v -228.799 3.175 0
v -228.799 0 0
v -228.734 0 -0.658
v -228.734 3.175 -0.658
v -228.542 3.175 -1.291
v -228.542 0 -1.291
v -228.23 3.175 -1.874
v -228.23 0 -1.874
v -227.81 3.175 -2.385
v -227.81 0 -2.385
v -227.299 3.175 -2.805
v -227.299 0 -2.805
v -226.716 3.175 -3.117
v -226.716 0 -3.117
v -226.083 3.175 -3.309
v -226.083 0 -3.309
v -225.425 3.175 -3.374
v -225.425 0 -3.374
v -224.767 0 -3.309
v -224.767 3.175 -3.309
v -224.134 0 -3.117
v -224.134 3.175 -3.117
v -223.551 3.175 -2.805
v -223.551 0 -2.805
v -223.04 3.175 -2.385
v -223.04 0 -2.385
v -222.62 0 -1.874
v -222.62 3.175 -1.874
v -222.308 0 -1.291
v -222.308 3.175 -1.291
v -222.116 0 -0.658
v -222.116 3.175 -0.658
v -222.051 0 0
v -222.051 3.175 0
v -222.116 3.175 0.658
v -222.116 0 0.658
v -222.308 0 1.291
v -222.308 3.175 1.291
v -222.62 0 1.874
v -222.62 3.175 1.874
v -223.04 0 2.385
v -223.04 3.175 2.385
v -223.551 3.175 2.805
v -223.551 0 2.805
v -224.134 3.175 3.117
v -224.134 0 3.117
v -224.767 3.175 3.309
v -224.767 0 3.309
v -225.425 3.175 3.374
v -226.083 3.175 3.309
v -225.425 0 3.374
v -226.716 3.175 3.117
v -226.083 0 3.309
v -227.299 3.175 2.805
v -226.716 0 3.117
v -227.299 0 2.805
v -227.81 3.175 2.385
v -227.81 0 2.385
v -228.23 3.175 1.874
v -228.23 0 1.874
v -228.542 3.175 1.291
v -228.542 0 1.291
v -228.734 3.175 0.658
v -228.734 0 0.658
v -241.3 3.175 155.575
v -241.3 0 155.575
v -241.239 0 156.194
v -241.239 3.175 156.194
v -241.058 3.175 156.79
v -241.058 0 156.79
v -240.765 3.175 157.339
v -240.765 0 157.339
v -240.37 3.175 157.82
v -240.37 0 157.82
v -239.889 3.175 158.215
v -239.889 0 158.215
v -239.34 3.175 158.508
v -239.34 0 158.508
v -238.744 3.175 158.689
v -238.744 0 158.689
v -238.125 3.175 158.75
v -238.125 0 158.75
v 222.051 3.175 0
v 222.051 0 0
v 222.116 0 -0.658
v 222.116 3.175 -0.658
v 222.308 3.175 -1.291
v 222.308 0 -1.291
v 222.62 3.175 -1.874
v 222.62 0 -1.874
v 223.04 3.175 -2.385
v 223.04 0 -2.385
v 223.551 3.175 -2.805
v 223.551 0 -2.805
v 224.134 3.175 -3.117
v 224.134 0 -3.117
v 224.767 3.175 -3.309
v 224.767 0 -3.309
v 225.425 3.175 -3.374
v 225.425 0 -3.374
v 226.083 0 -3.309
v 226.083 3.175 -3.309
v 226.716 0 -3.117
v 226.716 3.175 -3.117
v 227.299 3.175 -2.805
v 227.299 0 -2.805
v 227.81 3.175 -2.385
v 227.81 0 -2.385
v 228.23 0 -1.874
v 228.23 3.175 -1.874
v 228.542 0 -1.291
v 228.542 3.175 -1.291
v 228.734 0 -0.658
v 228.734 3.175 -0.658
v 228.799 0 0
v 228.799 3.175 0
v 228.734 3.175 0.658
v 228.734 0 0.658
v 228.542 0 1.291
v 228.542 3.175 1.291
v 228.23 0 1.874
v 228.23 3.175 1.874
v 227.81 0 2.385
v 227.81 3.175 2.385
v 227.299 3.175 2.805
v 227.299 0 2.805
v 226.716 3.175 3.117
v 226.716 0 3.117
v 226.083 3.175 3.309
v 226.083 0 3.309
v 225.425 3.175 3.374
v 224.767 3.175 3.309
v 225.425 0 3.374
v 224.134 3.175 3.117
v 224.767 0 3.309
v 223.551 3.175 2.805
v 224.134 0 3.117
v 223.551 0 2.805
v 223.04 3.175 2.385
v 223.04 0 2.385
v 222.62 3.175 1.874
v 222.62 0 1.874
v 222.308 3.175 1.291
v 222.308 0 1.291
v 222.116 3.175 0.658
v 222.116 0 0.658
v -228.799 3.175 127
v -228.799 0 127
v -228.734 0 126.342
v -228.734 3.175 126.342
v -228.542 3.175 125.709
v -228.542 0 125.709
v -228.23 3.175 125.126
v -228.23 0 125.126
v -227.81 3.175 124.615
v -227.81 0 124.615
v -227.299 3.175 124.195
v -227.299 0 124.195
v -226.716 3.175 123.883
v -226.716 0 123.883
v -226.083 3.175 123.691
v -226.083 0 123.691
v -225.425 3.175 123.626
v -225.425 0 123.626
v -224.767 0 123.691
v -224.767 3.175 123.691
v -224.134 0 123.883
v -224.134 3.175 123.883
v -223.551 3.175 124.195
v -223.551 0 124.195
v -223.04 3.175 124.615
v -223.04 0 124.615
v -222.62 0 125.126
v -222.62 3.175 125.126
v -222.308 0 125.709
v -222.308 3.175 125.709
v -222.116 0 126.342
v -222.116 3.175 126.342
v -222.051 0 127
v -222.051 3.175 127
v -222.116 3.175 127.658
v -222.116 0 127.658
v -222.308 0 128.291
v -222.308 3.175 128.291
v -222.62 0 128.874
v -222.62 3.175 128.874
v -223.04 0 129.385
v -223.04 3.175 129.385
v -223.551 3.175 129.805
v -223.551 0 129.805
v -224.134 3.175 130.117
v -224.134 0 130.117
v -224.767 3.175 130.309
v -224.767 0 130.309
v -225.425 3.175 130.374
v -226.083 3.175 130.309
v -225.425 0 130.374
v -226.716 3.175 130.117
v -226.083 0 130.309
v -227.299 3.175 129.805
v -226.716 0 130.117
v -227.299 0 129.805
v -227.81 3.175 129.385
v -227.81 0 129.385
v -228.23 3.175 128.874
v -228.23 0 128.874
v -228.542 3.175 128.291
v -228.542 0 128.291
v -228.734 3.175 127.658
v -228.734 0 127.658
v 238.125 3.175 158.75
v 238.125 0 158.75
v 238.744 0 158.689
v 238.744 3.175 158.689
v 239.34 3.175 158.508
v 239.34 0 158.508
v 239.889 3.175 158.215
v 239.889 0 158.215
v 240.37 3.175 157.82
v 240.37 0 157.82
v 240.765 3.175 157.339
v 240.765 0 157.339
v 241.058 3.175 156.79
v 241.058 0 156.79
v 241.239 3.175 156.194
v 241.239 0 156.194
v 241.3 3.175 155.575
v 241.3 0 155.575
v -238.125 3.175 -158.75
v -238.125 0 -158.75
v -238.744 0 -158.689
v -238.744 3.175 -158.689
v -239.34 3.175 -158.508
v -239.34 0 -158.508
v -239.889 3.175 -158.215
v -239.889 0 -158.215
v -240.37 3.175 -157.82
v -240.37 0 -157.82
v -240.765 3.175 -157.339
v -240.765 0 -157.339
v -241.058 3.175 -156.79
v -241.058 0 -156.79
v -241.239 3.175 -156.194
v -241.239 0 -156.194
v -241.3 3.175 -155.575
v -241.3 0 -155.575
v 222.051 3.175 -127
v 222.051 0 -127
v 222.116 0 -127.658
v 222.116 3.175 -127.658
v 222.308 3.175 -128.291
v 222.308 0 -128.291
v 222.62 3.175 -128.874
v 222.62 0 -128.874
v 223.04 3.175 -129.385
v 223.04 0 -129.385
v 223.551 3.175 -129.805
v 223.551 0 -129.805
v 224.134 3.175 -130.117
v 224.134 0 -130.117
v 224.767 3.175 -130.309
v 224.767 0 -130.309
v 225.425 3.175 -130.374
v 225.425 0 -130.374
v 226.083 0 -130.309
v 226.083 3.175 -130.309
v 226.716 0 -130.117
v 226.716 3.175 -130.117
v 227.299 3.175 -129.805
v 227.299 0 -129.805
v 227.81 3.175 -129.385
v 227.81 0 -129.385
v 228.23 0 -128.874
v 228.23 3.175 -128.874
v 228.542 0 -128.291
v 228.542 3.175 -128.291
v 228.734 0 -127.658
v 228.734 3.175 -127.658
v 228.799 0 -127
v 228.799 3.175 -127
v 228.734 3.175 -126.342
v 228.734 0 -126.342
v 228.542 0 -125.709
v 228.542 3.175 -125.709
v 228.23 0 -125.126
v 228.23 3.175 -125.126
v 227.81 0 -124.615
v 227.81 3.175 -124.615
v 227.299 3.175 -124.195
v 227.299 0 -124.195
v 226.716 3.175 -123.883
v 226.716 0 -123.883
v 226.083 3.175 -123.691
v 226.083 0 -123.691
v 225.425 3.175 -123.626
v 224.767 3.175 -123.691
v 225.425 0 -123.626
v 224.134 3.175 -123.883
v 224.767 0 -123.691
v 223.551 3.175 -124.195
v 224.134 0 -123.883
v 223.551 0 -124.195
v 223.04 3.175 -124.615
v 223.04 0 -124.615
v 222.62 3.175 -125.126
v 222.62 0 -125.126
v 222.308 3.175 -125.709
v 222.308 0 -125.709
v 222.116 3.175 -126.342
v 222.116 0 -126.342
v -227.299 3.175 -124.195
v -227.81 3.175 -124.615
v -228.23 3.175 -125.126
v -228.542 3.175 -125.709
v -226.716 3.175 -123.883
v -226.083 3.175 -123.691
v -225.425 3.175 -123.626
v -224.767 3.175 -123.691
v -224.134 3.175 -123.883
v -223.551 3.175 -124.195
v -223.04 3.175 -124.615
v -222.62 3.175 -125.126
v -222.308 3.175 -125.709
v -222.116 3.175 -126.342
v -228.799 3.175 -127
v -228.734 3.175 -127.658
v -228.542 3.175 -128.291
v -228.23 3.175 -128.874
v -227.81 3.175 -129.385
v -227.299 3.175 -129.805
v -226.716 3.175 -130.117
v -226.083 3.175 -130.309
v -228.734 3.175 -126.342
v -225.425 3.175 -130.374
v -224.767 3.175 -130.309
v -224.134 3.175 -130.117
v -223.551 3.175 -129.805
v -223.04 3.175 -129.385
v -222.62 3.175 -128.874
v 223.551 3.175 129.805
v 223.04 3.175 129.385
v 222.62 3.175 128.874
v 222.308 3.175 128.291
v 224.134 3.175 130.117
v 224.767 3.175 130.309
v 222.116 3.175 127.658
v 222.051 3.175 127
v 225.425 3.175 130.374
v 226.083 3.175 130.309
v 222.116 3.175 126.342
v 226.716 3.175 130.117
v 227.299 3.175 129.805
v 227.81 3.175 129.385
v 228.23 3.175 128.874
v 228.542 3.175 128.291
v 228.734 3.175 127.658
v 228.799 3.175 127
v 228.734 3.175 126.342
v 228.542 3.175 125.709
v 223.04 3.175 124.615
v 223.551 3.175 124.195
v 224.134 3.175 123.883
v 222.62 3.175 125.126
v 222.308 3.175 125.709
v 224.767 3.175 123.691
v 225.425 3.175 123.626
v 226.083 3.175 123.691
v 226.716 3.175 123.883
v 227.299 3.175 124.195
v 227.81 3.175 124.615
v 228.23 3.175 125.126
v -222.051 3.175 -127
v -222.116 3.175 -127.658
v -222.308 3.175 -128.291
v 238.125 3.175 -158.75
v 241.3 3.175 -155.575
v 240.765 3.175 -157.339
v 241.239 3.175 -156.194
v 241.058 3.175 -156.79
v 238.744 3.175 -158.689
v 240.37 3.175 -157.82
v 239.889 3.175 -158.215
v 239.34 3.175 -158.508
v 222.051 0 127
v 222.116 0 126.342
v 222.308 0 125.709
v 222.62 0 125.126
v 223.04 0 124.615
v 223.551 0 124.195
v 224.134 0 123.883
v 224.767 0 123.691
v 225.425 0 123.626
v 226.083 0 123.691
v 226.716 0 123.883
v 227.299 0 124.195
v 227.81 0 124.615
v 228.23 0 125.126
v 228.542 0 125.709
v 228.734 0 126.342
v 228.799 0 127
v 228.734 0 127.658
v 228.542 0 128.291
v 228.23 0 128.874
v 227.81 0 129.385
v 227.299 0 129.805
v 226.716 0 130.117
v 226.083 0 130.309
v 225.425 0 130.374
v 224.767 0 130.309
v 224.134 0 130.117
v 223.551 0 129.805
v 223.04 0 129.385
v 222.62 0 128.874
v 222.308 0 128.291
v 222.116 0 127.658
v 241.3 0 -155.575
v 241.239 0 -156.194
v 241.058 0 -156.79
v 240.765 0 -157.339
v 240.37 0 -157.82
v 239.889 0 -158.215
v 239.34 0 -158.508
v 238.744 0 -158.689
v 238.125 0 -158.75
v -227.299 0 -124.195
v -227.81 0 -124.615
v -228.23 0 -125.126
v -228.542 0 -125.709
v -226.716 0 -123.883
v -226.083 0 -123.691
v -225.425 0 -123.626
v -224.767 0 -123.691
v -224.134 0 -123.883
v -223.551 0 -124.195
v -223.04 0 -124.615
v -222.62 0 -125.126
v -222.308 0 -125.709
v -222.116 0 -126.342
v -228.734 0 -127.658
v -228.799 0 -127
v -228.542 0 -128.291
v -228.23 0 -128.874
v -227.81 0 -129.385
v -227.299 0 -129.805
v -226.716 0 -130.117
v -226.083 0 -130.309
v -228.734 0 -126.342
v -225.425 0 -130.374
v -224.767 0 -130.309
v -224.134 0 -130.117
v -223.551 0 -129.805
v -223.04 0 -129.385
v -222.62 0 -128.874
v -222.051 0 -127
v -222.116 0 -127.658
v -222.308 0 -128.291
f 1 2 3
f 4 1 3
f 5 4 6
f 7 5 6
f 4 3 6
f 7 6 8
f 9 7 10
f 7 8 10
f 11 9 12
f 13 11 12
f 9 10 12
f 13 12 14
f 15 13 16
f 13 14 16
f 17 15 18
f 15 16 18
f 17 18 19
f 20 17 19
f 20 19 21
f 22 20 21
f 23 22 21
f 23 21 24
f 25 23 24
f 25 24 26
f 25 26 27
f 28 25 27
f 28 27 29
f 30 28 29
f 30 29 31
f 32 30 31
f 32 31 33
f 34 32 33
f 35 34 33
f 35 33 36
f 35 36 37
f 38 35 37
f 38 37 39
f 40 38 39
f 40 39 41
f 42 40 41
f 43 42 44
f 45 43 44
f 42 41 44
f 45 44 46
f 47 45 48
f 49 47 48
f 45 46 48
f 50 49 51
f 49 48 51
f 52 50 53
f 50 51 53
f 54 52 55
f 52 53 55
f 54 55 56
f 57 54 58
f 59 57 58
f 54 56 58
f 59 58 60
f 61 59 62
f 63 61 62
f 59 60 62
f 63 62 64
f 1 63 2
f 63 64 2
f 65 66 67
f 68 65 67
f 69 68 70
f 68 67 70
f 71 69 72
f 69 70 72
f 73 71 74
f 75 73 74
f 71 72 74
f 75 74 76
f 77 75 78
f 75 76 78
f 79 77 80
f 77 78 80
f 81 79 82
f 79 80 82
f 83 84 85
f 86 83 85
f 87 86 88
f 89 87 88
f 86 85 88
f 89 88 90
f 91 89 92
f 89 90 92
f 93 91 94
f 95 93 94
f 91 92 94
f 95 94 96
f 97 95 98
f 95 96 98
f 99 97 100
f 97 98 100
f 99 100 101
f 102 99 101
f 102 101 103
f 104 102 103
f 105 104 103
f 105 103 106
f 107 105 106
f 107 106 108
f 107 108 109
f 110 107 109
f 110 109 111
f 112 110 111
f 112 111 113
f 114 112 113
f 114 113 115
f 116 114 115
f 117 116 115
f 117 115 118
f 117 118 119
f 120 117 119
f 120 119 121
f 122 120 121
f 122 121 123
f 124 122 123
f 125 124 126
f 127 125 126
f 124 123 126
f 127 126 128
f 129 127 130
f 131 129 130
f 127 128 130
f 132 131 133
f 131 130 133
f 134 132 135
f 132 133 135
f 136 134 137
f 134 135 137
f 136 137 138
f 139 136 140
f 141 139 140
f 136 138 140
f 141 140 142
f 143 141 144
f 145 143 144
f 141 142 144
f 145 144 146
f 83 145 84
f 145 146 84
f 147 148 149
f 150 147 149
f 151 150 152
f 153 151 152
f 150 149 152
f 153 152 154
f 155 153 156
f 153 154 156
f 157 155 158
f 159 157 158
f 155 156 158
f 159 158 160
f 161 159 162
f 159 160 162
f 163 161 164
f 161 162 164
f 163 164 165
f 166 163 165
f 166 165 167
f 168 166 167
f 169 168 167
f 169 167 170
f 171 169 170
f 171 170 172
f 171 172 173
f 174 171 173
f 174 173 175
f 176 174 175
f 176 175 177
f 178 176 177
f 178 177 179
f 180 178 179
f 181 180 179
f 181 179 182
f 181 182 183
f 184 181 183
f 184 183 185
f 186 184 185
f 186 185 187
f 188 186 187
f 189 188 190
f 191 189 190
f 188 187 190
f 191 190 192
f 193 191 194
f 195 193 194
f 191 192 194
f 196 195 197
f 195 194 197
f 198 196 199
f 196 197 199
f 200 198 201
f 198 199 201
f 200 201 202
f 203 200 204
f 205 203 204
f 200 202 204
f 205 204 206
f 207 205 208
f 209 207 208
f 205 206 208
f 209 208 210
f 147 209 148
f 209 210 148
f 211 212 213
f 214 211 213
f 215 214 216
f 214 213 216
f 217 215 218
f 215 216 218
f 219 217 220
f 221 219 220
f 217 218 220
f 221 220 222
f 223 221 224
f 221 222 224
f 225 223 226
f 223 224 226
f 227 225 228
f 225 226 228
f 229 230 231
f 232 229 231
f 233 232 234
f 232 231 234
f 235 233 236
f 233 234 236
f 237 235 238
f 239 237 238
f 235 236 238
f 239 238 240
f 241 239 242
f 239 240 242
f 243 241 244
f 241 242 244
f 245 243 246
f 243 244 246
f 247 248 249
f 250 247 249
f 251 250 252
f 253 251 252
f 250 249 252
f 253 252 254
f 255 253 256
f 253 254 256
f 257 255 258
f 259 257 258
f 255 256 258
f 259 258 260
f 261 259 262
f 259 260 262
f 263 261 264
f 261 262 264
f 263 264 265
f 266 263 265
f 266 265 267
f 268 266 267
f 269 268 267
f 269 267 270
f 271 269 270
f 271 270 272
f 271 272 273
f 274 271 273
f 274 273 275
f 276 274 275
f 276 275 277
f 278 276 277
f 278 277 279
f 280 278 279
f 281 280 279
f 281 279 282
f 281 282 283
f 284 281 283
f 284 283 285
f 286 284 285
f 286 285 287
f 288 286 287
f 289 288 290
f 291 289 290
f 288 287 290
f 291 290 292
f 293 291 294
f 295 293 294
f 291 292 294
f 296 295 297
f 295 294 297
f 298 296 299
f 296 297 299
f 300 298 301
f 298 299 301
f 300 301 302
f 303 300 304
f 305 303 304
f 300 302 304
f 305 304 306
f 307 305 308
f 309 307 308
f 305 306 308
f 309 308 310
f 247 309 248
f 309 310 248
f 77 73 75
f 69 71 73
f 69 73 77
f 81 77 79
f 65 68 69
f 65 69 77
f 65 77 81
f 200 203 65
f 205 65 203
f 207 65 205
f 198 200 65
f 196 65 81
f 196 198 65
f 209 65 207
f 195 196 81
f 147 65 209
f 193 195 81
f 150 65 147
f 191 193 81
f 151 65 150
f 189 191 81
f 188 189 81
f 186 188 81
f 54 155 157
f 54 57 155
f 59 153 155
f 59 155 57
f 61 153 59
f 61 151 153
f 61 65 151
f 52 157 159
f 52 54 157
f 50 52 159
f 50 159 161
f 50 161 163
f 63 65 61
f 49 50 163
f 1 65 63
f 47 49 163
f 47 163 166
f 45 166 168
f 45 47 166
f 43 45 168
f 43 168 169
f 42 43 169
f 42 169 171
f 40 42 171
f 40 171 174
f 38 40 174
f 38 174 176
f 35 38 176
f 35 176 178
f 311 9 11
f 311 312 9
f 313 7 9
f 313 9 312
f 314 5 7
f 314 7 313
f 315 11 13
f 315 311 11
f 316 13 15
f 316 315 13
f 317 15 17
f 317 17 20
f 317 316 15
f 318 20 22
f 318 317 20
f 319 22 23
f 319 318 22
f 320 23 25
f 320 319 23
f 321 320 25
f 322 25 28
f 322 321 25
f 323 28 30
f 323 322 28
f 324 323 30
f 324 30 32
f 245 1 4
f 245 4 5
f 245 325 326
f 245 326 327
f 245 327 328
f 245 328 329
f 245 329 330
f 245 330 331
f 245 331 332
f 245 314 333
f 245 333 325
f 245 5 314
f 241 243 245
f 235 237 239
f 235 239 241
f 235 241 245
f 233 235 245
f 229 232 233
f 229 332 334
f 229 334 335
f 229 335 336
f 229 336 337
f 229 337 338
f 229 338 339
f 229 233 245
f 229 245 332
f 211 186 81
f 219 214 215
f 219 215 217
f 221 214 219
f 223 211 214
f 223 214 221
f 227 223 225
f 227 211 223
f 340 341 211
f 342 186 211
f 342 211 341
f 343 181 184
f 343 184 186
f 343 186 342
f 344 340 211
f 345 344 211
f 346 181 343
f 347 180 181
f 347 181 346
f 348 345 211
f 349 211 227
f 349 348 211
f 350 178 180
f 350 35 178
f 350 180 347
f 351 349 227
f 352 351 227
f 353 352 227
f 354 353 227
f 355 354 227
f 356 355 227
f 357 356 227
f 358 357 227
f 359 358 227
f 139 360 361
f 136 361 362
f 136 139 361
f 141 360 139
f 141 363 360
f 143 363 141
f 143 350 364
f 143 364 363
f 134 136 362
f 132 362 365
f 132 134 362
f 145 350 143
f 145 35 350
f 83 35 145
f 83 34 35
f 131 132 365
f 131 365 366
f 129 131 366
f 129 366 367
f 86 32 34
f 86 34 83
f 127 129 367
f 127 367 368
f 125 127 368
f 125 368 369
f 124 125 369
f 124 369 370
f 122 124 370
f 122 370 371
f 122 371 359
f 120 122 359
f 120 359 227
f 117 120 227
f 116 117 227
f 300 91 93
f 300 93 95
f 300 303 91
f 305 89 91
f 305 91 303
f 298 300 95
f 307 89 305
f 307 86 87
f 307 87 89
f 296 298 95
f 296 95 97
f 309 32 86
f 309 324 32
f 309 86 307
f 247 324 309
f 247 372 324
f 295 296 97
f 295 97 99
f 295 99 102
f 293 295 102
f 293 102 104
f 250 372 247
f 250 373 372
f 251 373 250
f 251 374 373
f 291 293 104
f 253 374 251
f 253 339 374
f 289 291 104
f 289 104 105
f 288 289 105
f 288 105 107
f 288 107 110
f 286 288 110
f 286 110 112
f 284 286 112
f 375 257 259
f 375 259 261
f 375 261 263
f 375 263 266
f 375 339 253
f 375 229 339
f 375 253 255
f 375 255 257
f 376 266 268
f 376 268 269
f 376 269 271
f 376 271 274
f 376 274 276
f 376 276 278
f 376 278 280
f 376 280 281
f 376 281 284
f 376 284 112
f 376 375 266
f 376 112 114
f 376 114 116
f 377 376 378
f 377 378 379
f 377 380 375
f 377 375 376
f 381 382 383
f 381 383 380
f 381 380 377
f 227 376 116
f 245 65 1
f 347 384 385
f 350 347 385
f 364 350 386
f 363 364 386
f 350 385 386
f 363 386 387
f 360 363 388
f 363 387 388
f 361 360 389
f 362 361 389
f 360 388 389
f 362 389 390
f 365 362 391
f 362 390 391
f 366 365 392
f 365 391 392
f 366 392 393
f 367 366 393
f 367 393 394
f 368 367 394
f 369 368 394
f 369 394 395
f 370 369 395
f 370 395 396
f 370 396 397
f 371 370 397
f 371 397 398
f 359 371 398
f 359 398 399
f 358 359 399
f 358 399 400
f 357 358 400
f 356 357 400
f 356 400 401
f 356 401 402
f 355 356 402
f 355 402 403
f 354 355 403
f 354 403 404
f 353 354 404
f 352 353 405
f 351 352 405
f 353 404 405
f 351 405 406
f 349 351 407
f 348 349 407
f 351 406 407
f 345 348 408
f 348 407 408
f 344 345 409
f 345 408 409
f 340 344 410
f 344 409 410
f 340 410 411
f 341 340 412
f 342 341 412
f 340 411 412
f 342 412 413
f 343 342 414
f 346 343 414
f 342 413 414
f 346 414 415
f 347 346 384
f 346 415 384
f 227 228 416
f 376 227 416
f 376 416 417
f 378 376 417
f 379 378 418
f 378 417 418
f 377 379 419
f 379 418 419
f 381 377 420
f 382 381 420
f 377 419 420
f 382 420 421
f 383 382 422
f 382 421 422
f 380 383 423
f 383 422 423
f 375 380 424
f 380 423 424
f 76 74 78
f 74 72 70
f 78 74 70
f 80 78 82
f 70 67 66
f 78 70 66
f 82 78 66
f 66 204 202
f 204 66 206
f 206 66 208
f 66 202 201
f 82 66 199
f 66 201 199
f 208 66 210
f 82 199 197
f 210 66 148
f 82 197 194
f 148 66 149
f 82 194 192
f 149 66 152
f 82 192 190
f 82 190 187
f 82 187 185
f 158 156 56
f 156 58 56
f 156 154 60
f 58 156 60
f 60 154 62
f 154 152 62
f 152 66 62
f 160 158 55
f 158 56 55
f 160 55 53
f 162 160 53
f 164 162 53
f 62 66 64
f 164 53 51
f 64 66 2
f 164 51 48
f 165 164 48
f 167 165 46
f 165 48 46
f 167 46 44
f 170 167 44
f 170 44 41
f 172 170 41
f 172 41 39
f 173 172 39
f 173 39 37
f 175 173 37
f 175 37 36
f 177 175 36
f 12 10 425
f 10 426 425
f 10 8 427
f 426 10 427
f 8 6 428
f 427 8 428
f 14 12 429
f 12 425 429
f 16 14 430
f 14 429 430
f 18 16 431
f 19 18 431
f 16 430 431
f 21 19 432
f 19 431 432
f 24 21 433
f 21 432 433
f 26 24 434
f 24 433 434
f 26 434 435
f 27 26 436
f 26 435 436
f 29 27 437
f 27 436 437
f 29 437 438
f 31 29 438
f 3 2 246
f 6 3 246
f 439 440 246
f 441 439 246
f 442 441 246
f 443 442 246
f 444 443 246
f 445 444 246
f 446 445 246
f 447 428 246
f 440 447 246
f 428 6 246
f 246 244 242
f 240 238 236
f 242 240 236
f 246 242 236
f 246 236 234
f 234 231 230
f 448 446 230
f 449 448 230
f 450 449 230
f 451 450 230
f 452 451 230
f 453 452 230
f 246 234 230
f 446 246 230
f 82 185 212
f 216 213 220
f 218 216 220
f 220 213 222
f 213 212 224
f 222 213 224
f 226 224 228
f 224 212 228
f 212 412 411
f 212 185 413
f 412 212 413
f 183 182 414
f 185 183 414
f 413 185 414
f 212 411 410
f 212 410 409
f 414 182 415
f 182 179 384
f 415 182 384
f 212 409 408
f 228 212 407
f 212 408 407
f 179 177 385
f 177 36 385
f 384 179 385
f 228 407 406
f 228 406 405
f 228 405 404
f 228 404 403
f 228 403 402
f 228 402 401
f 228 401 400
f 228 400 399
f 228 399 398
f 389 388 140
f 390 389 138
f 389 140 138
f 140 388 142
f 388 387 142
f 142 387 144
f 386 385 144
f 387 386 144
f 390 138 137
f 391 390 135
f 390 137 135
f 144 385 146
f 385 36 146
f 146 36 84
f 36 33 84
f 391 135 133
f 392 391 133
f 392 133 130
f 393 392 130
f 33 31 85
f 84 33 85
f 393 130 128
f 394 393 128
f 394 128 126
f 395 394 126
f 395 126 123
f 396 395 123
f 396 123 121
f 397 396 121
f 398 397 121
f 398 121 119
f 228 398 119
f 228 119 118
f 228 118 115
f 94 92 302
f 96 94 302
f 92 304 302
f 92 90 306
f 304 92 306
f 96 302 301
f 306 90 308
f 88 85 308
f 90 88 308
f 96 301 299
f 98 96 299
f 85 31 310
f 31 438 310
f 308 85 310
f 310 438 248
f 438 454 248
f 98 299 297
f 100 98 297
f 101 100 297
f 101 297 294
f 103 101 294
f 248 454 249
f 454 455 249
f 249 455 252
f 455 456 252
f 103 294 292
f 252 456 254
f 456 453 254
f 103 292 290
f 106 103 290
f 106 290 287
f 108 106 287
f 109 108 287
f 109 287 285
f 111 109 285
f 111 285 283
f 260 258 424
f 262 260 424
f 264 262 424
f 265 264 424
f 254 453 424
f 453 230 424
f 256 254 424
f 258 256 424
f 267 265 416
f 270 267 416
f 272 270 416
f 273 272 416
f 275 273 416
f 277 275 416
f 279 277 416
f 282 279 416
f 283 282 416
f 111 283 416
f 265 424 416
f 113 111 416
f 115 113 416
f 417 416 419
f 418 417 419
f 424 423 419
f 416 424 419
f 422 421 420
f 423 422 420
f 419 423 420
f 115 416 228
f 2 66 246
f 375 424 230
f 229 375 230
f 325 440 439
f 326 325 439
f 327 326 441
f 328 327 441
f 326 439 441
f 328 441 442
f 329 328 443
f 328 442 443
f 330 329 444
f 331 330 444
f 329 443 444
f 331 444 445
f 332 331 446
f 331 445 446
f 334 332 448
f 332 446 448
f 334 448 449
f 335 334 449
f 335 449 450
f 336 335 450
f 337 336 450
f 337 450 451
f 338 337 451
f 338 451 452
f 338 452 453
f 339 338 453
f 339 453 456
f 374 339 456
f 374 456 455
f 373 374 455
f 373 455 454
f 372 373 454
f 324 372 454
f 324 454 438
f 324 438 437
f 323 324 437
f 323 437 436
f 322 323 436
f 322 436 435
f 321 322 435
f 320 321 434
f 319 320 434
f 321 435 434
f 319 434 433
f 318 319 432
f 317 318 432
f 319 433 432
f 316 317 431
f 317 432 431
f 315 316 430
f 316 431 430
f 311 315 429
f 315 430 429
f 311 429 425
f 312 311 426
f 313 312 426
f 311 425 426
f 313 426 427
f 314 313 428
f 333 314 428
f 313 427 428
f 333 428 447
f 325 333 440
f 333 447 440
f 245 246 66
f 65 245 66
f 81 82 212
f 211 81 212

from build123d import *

# Parameters (mm, degrees)
BOSS_EXTRUDE1_DEPTH              = 3.175
F_17_64_0_26563_DIAMETER_HOLE1_D = 6.747002


with BuildPart() as part:
    # Sketch1 → Boss-Extrude1 (new body)
    with BuildSketch(Plane(origin=(0, 0, 0), x_dir=(1, 0, 0), z_dir=(0, 1, 0))):
        with BuildLine():
            Line((-238.125, -158.75), (238.125, -158.75))
            ThreePointArc((238.125, -158.75), (240.37006403, -157.82006403), (241.3, -155.575))
            Line((241.3, -155.575), (241.3, 155.575))
            ThreePointArc((241.3, 155.575), (240.37006403, 157.82006403), (238.125, 158.75))
            Line((238.125, 158.75), (-238.125, 158.75))
            ThreePointArc((-238.125, 158.75), (-240.37006403, 157.82006403), (-241.3, 155.575))
            Line((-241.3, 155.575), (-241.3, -155.575))
            ThreePointArc((-241.3, -155.575), (-240.37006403, -157.82006403), (-238.125, -158.75))
        make_face()
    extrude(amount=BOSS_EXTRUDE1_DEPTH)

    # 17/64 (0.26563) Diameter Hole1 (through all)
    with Locations(Plane(origin=(0, 3.175, 0), x_dir=(1, 0, 0), z_dir=(0, 1, 0))):
        with Locations((-225.425, 127), (-225.425, 0), (-225.425, -127), (225.425, 127), (225.425, 0), (225.425, -127)):
            Hole(F_17_64_0_26563_DIAMETER_HOLE1_D / 2)


solid = part.part
